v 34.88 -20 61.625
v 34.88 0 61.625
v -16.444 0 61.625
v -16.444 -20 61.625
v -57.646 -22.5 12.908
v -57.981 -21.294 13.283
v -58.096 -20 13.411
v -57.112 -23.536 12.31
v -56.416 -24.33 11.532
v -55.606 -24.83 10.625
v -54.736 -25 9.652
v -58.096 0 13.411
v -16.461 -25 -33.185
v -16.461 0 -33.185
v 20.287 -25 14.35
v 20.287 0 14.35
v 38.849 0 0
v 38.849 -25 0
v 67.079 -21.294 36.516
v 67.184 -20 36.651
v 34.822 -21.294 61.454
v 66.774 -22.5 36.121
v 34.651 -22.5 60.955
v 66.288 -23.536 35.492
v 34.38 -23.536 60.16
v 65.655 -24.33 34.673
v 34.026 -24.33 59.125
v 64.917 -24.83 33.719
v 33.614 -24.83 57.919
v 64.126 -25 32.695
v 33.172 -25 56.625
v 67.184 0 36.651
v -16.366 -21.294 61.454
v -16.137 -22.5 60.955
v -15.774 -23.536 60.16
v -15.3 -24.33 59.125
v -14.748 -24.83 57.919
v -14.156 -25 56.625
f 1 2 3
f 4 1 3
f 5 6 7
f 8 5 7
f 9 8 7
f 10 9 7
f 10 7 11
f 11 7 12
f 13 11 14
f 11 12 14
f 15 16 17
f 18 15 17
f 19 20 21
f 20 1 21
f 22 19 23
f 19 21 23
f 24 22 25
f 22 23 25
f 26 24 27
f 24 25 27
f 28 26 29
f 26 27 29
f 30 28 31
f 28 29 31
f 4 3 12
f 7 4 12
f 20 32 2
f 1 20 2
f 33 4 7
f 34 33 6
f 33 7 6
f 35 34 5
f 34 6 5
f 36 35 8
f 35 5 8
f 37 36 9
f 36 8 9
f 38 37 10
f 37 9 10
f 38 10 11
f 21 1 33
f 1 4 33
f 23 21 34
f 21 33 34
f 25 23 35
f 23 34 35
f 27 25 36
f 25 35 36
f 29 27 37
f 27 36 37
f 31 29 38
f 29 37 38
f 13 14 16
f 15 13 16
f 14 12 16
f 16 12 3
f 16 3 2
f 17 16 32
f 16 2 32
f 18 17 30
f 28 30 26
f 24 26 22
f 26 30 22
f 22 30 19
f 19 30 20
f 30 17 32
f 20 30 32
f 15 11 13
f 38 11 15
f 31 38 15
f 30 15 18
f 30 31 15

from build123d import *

# Parameters (mm, degrees)
F1_DEPTH = 25
F2_R     = 5


with BuildPart() as f1:
    # F0 (on Front) → F1 (new body)
    with BuildSketch(Plane.XZ):
        Polygon((-58.095872, 13.411373), (-16.461365, -33.184543), (20.287085, 14.35025), (38.849397, 0), (67.183668, 36.650898), (34.879841, 61.624512), (-16.44367, 61.624512), align=None)
    extrude(amount=F1_DEPTH)

    # F2
    f2_edges = [f1.edges().sort_by_distance(p)[0] for p in [
        (51.031754, -25, 49.137705),
        (9.218086, -25, 61.624512),
        (-37.269771, -25, 37.517942),
    ]]
    fillet(f2_edges, radius=F2_R)


solid = f1.part
